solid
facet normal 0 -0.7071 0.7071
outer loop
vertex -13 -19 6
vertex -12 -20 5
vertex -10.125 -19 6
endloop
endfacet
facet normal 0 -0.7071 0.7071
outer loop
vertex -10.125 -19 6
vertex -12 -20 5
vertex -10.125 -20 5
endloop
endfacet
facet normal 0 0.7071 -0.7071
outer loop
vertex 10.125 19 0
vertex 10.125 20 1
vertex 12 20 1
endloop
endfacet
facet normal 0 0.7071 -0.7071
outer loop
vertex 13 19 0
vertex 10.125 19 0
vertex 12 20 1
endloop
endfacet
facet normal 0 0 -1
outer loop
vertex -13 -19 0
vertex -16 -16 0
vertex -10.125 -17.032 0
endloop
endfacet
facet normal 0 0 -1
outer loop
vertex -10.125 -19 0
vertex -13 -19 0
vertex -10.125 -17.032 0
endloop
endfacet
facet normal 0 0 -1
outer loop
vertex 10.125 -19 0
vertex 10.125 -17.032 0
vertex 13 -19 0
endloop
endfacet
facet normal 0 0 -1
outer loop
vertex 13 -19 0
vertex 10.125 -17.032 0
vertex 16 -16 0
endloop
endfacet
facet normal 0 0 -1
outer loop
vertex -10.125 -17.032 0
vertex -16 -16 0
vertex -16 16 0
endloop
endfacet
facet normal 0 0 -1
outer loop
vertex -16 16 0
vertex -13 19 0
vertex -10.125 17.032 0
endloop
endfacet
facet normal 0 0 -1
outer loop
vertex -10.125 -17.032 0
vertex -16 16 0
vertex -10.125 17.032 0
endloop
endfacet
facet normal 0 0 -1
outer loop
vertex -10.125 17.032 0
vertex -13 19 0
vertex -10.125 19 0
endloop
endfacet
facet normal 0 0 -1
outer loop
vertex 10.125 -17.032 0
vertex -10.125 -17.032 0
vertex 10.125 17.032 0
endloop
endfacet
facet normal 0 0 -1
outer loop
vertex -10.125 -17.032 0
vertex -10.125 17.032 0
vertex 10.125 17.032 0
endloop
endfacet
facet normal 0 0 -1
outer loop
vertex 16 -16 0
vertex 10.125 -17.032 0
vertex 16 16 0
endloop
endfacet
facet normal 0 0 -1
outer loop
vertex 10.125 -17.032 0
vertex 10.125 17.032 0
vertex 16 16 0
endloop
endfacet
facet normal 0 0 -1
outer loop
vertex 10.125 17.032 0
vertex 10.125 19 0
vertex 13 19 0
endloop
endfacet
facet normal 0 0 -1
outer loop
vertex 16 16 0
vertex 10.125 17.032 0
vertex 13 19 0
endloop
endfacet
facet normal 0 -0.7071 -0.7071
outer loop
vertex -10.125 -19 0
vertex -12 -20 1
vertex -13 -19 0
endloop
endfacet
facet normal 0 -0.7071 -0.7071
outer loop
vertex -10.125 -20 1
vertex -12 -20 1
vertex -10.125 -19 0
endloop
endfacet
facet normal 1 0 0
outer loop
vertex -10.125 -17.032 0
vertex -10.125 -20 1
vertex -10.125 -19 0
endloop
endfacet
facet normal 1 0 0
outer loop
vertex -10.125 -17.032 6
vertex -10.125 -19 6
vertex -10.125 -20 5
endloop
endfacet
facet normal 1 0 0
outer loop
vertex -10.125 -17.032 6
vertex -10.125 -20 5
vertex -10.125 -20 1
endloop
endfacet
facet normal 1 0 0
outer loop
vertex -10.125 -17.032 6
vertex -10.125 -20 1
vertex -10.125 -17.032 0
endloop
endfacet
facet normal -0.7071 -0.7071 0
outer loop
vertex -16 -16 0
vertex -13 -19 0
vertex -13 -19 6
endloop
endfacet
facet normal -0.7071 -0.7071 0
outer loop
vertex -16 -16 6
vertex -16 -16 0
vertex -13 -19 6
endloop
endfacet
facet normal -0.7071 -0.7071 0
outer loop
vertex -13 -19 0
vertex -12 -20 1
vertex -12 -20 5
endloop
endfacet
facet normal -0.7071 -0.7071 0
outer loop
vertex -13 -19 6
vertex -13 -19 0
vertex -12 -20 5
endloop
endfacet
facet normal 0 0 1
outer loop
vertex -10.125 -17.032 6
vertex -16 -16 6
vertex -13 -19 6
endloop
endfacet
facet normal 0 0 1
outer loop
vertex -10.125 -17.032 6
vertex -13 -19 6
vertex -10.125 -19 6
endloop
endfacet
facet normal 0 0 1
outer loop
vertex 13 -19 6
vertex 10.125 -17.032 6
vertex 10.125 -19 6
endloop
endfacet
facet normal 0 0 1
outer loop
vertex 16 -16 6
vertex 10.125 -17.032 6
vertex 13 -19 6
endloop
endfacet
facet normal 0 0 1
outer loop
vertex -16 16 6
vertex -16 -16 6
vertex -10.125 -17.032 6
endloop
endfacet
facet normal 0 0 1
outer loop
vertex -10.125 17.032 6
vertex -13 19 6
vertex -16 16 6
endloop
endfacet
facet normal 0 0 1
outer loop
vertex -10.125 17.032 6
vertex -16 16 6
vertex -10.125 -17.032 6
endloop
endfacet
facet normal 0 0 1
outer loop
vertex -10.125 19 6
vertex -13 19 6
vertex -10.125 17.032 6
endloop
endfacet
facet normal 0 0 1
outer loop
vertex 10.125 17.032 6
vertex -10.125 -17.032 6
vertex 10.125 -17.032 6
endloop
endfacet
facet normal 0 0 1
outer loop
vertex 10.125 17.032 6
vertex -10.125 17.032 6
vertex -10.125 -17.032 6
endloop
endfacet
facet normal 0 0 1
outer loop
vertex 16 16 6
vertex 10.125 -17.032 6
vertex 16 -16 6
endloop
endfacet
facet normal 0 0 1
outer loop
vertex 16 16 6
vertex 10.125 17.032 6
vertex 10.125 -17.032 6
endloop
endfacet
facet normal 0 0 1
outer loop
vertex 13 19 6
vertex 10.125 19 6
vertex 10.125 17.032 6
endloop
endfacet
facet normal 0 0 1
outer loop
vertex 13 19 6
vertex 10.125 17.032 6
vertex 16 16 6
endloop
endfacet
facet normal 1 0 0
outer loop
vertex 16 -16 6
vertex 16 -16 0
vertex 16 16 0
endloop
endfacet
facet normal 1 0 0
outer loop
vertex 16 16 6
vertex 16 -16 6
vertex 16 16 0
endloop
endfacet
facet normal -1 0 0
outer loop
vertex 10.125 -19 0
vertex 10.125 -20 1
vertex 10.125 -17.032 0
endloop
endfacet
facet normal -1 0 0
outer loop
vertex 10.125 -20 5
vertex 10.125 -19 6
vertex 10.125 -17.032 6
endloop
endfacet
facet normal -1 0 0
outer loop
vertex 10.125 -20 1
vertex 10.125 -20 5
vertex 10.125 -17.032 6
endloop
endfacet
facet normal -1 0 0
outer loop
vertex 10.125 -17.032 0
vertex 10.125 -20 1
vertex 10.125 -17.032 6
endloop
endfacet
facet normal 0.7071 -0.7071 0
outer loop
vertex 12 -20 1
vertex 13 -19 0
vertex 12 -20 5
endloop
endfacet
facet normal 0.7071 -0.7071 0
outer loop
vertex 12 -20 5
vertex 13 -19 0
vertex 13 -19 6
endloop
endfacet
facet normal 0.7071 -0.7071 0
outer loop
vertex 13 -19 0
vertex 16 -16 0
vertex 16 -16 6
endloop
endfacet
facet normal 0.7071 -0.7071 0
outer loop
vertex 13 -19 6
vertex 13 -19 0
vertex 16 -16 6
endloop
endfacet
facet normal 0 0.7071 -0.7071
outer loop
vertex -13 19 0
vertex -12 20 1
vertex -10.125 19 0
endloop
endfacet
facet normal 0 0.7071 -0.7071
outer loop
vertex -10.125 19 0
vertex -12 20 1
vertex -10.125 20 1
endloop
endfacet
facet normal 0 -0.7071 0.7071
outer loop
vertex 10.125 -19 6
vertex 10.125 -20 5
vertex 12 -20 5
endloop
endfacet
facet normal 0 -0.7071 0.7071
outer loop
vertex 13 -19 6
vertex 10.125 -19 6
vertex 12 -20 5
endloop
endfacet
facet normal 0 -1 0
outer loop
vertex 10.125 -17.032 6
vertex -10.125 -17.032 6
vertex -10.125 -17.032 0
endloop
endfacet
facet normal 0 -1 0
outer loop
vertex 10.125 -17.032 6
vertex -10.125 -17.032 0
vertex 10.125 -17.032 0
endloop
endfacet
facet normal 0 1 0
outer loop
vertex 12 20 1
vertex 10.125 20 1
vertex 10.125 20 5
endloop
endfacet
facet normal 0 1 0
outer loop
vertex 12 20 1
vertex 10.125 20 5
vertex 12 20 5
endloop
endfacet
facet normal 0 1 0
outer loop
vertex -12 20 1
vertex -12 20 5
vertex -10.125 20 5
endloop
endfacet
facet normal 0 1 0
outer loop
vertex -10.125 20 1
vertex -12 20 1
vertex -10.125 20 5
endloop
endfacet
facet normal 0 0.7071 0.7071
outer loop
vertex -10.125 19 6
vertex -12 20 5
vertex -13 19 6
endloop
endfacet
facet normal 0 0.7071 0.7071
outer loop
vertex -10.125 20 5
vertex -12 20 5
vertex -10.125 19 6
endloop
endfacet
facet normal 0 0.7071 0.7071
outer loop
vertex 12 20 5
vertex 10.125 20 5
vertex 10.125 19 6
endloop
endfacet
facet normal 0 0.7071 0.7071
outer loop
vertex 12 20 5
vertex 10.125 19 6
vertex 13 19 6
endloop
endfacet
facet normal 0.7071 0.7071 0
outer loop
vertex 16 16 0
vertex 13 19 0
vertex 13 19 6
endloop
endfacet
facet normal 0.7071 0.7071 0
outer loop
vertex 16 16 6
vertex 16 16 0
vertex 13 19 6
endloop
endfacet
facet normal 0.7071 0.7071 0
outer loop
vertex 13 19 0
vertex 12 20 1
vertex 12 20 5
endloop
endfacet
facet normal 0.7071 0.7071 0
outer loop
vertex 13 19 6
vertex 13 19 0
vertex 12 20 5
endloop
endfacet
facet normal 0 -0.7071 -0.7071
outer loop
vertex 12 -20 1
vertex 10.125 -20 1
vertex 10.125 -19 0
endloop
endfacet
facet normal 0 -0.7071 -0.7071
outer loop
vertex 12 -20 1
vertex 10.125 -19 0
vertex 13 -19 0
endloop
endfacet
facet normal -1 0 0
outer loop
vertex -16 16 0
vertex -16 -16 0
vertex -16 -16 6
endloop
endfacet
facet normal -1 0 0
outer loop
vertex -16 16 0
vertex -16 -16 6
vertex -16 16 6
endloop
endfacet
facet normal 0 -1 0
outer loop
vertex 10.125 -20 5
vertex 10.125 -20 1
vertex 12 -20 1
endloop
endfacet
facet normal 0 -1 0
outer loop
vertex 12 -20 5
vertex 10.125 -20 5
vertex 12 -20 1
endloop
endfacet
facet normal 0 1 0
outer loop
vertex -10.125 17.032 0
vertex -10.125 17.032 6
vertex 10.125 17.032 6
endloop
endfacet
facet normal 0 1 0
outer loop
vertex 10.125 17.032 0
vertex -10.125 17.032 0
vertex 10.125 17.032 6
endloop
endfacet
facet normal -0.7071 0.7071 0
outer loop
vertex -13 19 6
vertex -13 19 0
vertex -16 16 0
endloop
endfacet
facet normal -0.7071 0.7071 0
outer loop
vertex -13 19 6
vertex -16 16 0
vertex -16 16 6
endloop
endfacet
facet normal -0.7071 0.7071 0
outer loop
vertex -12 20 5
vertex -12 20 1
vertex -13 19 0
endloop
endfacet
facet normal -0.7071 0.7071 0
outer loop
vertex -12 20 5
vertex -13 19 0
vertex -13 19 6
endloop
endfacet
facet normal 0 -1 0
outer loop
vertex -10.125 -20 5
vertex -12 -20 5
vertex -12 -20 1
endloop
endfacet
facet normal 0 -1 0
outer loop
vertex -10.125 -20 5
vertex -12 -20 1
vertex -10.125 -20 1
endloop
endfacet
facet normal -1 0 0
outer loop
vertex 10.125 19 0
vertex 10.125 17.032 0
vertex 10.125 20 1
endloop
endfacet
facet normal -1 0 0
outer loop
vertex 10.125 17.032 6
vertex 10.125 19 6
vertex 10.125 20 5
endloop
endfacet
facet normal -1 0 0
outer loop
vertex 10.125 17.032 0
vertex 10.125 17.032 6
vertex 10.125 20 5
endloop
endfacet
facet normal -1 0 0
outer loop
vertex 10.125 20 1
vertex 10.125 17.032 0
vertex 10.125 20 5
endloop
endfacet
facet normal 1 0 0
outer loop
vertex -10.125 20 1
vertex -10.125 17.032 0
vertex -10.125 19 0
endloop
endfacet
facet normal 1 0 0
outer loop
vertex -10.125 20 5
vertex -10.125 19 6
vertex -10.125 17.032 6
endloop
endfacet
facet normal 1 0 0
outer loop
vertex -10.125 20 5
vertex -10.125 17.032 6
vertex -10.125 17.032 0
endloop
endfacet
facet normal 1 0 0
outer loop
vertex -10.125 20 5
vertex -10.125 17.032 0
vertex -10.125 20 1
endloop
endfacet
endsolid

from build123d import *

# Parameters (mm, degrees)
SKETCH_W        = 32
SKETCH_H        = 40
PAD_DEPTH       = 6
CHAMFER_SIZE    = 4
CHAMFER001_SIZE = 1
SKETCH001_W     = 20.25
SKETCH001_H     = 20
POCKET_DEPTH    = 10


with BuildPart() as part:
    # Sketch (on XY_Plane of Origin) → Pad (new body)
    with BuildSketch(Plane.XY):
        Rectangle(SKETCH_W, SKETCH_H)
    extrude(amount=PAD_DEPTH)

    # Chamfer
    chamfer_edges = [part.edges().sort_by_distance(p)[0] for p in [
        (16, 20, 3),
        (16, -20, 3),
        (-16, 20, 3),
        (-16, -20, 3),
    ]]
    chamfer(chamfer_edges, length=CHAMFER_SIZE)

    # Chamfer001
    chamfer001_edges = [part.edges().sort_by_distance(p)[0] for p in [
        (0, -20, 0),
        (0, -20, 6),
        (0, 20, 0),
        (0, 20, 6),
    ]]
    chamfer(chamfer001_edges, length=CHAMFER001_SIZE)

    # Sketch001 (on Face8 of Chamfer001) → Pocket (cut)
    with BuildSketch(Plane.XY.offset(6)):
        with Locations((0, -27.031727)):
            Rectangle(SKETCH001_W, SKETCH001_H)
        with Locations((0, 27.031727)):
            Rectangle(SKETCH001_W, SKETCH001_H)
    extrude(amount=-POCKET_DEPTH, mode=Mode.SUBTRACT)


solid = part.part
